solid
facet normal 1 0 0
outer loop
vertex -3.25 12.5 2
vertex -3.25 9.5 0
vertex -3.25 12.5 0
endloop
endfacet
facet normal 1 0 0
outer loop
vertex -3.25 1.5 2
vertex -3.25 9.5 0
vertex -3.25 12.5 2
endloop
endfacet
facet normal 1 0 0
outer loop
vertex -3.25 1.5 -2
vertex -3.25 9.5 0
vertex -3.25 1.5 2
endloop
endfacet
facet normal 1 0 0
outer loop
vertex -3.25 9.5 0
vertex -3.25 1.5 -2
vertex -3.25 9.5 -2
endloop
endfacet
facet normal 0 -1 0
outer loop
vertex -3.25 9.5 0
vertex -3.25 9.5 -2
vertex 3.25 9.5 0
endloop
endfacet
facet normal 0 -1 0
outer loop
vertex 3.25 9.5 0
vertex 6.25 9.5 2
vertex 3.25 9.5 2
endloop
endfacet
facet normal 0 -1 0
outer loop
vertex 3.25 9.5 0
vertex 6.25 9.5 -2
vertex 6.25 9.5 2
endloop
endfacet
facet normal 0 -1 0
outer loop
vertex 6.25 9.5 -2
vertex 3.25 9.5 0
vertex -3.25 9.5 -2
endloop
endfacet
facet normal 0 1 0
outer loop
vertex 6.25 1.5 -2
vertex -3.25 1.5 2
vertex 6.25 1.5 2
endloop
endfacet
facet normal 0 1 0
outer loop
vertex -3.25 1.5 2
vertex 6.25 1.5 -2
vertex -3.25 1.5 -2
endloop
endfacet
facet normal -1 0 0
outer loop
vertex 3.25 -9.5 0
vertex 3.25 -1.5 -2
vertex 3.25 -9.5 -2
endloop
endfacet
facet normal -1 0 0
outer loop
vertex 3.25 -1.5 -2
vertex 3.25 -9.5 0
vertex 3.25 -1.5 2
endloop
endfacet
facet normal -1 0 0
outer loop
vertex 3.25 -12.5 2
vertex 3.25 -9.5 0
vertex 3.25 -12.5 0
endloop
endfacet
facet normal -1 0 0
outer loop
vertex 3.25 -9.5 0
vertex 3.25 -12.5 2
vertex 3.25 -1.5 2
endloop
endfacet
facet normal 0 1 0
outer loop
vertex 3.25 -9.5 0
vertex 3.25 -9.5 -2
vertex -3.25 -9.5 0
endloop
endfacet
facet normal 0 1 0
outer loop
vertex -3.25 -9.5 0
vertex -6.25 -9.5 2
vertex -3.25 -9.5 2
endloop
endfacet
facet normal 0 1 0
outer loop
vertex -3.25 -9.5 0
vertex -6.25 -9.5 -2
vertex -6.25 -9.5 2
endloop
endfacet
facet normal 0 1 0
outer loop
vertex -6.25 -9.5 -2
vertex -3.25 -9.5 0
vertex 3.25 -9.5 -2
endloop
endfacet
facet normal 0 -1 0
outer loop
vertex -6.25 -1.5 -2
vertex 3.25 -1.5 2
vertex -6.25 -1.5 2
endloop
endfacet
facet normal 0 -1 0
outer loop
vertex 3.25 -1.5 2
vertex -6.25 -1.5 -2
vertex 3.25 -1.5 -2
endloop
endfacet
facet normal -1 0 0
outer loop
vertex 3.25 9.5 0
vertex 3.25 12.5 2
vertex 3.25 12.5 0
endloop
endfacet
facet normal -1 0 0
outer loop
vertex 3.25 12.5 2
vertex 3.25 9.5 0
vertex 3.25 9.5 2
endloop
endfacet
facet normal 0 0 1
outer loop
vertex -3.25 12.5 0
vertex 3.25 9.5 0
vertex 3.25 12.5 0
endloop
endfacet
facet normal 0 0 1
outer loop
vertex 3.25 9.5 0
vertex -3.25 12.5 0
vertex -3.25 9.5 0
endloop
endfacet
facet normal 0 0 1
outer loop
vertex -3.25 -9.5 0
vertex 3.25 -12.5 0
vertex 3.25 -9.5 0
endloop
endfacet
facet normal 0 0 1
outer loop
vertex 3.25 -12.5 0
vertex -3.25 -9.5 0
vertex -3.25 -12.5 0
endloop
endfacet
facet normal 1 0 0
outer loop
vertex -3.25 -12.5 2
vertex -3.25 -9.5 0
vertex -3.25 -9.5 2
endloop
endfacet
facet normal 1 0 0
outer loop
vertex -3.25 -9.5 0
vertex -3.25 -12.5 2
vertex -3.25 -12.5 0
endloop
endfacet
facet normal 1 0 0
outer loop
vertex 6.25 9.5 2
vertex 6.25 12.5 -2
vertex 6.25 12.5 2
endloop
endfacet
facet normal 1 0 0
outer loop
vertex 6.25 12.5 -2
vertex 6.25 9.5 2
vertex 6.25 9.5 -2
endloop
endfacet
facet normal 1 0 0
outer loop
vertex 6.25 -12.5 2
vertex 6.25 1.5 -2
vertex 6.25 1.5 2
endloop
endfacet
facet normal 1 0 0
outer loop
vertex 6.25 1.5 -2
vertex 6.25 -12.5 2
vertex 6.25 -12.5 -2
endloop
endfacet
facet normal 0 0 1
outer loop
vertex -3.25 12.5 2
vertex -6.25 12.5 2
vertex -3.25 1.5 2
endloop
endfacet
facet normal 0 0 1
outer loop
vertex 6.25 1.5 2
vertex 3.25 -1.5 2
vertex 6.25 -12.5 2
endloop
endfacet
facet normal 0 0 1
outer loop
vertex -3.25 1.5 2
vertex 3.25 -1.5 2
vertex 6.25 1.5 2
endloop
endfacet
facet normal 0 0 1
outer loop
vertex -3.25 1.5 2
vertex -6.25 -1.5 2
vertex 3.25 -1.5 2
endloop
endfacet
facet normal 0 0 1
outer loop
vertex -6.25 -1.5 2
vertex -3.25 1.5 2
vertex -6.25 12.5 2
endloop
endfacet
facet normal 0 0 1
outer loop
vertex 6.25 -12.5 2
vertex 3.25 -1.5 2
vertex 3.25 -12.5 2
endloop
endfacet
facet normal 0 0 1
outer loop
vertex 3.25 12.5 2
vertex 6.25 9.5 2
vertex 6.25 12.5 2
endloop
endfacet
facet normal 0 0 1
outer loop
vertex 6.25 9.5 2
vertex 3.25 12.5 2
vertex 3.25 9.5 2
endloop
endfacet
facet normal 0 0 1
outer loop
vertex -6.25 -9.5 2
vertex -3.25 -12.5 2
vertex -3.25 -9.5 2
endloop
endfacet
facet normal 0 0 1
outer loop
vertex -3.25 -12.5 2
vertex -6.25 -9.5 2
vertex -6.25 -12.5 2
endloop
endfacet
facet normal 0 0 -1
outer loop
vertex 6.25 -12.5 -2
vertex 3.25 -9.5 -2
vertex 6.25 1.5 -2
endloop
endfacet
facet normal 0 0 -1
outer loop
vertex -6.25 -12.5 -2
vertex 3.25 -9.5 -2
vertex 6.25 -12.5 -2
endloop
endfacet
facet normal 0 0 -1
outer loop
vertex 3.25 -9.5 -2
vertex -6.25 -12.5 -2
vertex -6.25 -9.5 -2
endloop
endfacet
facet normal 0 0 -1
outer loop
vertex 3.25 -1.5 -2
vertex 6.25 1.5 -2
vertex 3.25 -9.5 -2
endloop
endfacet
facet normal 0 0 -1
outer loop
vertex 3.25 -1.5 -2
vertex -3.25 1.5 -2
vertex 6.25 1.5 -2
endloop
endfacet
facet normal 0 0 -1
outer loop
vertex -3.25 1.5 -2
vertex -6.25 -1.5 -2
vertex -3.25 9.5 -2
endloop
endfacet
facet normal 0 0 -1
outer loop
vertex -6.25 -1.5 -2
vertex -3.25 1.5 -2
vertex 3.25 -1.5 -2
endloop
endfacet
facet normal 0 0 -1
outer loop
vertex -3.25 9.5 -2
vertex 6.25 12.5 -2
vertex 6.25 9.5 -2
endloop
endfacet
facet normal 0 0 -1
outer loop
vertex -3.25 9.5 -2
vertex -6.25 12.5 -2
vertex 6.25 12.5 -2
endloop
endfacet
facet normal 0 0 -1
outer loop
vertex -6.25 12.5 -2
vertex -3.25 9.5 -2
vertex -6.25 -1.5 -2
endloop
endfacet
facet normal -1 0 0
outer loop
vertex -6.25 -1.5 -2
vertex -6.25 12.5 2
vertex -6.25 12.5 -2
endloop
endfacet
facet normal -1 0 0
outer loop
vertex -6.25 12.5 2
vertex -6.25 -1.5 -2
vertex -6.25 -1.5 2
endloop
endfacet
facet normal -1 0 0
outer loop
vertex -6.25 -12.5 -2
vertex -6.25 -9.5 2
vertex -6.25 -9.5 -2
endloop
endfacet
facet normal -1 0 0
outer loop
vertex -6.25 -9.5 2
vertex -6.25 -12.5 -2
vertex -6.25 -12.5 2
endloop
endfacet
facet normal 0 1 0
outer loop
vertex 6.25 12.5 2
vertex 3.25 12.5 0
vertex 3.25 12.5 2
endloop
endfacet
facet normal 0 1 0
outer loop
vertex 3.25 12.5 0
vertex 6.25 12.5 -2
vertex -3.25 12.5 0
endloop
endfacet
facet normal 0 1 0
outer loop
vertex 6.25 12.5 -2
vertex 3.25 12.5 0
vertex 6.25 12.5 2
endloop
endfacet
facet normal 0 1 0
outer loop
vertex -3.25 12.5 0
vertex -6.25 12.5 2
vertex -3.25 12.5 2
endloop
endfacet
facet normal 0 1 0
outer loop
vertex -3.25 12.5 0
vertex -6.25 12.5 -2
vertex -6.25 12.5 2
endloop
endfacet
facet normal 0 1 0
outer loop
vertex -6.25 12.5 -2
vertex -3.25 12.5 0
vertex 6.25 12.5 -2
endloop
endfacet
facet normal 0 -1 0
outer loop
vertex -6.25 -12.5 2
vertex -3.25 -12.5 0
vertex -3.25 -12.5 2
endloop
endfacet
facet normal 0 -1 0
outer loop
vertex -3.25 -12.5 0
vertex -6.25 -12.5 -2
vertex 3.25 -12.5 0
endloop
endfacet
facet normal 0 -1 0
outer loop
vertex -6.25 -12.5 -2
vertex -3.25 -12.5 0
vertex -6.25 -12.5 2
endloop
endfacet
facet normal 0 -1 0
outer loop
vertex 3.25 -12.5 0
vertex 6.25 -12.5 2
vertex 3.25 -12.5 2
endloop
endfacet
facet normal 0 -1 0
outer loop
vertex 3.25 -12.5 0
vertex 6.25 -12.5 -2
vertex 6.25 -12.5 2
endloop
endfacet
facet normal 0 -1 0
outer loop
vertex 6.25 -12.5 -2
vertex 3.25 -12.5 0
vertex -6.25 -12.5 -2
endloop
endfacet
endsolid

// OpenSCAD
// [FL_INDEX: keywords="openscad, 3d_parametric, Customizable_Belt_Tensioner, csg_solid" | COT="Parametric OpenSCAD design from 3DCodeverse"]
// Title: Customizable Belt Tensioner 


// 
// source: http://www.thingiverse.com/thing:10082
// made for customizer
// alexander@nischelwitzer.com
//


  //////////////////////////
 // Customizer Settings: //
//////////////////////////

// How long should the belt-tension be? (mm)
tensionLength   = 25;  // [20:50]

// How thick should the tension be? (mm) 
tensionThick = 4; // [2:10]

// How large is the belt width? (1/10 mm)
beltWidth = 65; // [30:100]


// How deep is the notch? (mm)
notchDepth = 2; // [1:10]

  //////////////////////
 // Static Settings: //
//////////////////////

module GoAwayCustomizer() {
// This module is here to stop Customizer from picking up the variables below
}

// ---------------------------------------------------


beltTensioner(beltWidth/10, 3, tensionLength, tensionThick, notchDepth);



module beltTensioner(belt_width, post_width, length, thickness, notch_depth)
{
	module _beltTensioner(width, length, thickness, post_width, notch_depth)
	{
		cutout_width = width - post_width + 2;
		cutout_length = (length - post_width * 3) / 2;
		cutout_thickness = thickness + 6;

		notch_width = width - post_width * 2;
		module cutout()
		{
			translate([post_width / 2 + 1, length / 2 - cutout_length / 2 - post_width, 0])
			{
				cube([cutout_width, cutout_length, cutout_thickness], center=true);
			}
		}
	
		module notch_cutout()
		{
			translate([0,  length / 2 - post_width / 2, thickness / 2 - notch_depth / 2 + 1])
			{
				cube([notch_width, post_width + 2, notch_depth + 2], center= true);
			}
		}
		difference()
		{
			// Main body	
			cube([width, length, thickness], center=true);
	
			// Notches for "S" shape
			union()
			{
					cutout ();
					mirror([1, 0, 0])
					{
						mirror([0, 1, 0])
						{
							cutout ();
						}
					}
	
					// Notches for belt guide
					notch_cutout();
					mirror([0, 1, 0])
					{
						notch_cutout();
					}
			}
		}
	}
	_beltTensioner(belt_width + post_width * 2, length, thickness, post_width, notch_depth);
}
